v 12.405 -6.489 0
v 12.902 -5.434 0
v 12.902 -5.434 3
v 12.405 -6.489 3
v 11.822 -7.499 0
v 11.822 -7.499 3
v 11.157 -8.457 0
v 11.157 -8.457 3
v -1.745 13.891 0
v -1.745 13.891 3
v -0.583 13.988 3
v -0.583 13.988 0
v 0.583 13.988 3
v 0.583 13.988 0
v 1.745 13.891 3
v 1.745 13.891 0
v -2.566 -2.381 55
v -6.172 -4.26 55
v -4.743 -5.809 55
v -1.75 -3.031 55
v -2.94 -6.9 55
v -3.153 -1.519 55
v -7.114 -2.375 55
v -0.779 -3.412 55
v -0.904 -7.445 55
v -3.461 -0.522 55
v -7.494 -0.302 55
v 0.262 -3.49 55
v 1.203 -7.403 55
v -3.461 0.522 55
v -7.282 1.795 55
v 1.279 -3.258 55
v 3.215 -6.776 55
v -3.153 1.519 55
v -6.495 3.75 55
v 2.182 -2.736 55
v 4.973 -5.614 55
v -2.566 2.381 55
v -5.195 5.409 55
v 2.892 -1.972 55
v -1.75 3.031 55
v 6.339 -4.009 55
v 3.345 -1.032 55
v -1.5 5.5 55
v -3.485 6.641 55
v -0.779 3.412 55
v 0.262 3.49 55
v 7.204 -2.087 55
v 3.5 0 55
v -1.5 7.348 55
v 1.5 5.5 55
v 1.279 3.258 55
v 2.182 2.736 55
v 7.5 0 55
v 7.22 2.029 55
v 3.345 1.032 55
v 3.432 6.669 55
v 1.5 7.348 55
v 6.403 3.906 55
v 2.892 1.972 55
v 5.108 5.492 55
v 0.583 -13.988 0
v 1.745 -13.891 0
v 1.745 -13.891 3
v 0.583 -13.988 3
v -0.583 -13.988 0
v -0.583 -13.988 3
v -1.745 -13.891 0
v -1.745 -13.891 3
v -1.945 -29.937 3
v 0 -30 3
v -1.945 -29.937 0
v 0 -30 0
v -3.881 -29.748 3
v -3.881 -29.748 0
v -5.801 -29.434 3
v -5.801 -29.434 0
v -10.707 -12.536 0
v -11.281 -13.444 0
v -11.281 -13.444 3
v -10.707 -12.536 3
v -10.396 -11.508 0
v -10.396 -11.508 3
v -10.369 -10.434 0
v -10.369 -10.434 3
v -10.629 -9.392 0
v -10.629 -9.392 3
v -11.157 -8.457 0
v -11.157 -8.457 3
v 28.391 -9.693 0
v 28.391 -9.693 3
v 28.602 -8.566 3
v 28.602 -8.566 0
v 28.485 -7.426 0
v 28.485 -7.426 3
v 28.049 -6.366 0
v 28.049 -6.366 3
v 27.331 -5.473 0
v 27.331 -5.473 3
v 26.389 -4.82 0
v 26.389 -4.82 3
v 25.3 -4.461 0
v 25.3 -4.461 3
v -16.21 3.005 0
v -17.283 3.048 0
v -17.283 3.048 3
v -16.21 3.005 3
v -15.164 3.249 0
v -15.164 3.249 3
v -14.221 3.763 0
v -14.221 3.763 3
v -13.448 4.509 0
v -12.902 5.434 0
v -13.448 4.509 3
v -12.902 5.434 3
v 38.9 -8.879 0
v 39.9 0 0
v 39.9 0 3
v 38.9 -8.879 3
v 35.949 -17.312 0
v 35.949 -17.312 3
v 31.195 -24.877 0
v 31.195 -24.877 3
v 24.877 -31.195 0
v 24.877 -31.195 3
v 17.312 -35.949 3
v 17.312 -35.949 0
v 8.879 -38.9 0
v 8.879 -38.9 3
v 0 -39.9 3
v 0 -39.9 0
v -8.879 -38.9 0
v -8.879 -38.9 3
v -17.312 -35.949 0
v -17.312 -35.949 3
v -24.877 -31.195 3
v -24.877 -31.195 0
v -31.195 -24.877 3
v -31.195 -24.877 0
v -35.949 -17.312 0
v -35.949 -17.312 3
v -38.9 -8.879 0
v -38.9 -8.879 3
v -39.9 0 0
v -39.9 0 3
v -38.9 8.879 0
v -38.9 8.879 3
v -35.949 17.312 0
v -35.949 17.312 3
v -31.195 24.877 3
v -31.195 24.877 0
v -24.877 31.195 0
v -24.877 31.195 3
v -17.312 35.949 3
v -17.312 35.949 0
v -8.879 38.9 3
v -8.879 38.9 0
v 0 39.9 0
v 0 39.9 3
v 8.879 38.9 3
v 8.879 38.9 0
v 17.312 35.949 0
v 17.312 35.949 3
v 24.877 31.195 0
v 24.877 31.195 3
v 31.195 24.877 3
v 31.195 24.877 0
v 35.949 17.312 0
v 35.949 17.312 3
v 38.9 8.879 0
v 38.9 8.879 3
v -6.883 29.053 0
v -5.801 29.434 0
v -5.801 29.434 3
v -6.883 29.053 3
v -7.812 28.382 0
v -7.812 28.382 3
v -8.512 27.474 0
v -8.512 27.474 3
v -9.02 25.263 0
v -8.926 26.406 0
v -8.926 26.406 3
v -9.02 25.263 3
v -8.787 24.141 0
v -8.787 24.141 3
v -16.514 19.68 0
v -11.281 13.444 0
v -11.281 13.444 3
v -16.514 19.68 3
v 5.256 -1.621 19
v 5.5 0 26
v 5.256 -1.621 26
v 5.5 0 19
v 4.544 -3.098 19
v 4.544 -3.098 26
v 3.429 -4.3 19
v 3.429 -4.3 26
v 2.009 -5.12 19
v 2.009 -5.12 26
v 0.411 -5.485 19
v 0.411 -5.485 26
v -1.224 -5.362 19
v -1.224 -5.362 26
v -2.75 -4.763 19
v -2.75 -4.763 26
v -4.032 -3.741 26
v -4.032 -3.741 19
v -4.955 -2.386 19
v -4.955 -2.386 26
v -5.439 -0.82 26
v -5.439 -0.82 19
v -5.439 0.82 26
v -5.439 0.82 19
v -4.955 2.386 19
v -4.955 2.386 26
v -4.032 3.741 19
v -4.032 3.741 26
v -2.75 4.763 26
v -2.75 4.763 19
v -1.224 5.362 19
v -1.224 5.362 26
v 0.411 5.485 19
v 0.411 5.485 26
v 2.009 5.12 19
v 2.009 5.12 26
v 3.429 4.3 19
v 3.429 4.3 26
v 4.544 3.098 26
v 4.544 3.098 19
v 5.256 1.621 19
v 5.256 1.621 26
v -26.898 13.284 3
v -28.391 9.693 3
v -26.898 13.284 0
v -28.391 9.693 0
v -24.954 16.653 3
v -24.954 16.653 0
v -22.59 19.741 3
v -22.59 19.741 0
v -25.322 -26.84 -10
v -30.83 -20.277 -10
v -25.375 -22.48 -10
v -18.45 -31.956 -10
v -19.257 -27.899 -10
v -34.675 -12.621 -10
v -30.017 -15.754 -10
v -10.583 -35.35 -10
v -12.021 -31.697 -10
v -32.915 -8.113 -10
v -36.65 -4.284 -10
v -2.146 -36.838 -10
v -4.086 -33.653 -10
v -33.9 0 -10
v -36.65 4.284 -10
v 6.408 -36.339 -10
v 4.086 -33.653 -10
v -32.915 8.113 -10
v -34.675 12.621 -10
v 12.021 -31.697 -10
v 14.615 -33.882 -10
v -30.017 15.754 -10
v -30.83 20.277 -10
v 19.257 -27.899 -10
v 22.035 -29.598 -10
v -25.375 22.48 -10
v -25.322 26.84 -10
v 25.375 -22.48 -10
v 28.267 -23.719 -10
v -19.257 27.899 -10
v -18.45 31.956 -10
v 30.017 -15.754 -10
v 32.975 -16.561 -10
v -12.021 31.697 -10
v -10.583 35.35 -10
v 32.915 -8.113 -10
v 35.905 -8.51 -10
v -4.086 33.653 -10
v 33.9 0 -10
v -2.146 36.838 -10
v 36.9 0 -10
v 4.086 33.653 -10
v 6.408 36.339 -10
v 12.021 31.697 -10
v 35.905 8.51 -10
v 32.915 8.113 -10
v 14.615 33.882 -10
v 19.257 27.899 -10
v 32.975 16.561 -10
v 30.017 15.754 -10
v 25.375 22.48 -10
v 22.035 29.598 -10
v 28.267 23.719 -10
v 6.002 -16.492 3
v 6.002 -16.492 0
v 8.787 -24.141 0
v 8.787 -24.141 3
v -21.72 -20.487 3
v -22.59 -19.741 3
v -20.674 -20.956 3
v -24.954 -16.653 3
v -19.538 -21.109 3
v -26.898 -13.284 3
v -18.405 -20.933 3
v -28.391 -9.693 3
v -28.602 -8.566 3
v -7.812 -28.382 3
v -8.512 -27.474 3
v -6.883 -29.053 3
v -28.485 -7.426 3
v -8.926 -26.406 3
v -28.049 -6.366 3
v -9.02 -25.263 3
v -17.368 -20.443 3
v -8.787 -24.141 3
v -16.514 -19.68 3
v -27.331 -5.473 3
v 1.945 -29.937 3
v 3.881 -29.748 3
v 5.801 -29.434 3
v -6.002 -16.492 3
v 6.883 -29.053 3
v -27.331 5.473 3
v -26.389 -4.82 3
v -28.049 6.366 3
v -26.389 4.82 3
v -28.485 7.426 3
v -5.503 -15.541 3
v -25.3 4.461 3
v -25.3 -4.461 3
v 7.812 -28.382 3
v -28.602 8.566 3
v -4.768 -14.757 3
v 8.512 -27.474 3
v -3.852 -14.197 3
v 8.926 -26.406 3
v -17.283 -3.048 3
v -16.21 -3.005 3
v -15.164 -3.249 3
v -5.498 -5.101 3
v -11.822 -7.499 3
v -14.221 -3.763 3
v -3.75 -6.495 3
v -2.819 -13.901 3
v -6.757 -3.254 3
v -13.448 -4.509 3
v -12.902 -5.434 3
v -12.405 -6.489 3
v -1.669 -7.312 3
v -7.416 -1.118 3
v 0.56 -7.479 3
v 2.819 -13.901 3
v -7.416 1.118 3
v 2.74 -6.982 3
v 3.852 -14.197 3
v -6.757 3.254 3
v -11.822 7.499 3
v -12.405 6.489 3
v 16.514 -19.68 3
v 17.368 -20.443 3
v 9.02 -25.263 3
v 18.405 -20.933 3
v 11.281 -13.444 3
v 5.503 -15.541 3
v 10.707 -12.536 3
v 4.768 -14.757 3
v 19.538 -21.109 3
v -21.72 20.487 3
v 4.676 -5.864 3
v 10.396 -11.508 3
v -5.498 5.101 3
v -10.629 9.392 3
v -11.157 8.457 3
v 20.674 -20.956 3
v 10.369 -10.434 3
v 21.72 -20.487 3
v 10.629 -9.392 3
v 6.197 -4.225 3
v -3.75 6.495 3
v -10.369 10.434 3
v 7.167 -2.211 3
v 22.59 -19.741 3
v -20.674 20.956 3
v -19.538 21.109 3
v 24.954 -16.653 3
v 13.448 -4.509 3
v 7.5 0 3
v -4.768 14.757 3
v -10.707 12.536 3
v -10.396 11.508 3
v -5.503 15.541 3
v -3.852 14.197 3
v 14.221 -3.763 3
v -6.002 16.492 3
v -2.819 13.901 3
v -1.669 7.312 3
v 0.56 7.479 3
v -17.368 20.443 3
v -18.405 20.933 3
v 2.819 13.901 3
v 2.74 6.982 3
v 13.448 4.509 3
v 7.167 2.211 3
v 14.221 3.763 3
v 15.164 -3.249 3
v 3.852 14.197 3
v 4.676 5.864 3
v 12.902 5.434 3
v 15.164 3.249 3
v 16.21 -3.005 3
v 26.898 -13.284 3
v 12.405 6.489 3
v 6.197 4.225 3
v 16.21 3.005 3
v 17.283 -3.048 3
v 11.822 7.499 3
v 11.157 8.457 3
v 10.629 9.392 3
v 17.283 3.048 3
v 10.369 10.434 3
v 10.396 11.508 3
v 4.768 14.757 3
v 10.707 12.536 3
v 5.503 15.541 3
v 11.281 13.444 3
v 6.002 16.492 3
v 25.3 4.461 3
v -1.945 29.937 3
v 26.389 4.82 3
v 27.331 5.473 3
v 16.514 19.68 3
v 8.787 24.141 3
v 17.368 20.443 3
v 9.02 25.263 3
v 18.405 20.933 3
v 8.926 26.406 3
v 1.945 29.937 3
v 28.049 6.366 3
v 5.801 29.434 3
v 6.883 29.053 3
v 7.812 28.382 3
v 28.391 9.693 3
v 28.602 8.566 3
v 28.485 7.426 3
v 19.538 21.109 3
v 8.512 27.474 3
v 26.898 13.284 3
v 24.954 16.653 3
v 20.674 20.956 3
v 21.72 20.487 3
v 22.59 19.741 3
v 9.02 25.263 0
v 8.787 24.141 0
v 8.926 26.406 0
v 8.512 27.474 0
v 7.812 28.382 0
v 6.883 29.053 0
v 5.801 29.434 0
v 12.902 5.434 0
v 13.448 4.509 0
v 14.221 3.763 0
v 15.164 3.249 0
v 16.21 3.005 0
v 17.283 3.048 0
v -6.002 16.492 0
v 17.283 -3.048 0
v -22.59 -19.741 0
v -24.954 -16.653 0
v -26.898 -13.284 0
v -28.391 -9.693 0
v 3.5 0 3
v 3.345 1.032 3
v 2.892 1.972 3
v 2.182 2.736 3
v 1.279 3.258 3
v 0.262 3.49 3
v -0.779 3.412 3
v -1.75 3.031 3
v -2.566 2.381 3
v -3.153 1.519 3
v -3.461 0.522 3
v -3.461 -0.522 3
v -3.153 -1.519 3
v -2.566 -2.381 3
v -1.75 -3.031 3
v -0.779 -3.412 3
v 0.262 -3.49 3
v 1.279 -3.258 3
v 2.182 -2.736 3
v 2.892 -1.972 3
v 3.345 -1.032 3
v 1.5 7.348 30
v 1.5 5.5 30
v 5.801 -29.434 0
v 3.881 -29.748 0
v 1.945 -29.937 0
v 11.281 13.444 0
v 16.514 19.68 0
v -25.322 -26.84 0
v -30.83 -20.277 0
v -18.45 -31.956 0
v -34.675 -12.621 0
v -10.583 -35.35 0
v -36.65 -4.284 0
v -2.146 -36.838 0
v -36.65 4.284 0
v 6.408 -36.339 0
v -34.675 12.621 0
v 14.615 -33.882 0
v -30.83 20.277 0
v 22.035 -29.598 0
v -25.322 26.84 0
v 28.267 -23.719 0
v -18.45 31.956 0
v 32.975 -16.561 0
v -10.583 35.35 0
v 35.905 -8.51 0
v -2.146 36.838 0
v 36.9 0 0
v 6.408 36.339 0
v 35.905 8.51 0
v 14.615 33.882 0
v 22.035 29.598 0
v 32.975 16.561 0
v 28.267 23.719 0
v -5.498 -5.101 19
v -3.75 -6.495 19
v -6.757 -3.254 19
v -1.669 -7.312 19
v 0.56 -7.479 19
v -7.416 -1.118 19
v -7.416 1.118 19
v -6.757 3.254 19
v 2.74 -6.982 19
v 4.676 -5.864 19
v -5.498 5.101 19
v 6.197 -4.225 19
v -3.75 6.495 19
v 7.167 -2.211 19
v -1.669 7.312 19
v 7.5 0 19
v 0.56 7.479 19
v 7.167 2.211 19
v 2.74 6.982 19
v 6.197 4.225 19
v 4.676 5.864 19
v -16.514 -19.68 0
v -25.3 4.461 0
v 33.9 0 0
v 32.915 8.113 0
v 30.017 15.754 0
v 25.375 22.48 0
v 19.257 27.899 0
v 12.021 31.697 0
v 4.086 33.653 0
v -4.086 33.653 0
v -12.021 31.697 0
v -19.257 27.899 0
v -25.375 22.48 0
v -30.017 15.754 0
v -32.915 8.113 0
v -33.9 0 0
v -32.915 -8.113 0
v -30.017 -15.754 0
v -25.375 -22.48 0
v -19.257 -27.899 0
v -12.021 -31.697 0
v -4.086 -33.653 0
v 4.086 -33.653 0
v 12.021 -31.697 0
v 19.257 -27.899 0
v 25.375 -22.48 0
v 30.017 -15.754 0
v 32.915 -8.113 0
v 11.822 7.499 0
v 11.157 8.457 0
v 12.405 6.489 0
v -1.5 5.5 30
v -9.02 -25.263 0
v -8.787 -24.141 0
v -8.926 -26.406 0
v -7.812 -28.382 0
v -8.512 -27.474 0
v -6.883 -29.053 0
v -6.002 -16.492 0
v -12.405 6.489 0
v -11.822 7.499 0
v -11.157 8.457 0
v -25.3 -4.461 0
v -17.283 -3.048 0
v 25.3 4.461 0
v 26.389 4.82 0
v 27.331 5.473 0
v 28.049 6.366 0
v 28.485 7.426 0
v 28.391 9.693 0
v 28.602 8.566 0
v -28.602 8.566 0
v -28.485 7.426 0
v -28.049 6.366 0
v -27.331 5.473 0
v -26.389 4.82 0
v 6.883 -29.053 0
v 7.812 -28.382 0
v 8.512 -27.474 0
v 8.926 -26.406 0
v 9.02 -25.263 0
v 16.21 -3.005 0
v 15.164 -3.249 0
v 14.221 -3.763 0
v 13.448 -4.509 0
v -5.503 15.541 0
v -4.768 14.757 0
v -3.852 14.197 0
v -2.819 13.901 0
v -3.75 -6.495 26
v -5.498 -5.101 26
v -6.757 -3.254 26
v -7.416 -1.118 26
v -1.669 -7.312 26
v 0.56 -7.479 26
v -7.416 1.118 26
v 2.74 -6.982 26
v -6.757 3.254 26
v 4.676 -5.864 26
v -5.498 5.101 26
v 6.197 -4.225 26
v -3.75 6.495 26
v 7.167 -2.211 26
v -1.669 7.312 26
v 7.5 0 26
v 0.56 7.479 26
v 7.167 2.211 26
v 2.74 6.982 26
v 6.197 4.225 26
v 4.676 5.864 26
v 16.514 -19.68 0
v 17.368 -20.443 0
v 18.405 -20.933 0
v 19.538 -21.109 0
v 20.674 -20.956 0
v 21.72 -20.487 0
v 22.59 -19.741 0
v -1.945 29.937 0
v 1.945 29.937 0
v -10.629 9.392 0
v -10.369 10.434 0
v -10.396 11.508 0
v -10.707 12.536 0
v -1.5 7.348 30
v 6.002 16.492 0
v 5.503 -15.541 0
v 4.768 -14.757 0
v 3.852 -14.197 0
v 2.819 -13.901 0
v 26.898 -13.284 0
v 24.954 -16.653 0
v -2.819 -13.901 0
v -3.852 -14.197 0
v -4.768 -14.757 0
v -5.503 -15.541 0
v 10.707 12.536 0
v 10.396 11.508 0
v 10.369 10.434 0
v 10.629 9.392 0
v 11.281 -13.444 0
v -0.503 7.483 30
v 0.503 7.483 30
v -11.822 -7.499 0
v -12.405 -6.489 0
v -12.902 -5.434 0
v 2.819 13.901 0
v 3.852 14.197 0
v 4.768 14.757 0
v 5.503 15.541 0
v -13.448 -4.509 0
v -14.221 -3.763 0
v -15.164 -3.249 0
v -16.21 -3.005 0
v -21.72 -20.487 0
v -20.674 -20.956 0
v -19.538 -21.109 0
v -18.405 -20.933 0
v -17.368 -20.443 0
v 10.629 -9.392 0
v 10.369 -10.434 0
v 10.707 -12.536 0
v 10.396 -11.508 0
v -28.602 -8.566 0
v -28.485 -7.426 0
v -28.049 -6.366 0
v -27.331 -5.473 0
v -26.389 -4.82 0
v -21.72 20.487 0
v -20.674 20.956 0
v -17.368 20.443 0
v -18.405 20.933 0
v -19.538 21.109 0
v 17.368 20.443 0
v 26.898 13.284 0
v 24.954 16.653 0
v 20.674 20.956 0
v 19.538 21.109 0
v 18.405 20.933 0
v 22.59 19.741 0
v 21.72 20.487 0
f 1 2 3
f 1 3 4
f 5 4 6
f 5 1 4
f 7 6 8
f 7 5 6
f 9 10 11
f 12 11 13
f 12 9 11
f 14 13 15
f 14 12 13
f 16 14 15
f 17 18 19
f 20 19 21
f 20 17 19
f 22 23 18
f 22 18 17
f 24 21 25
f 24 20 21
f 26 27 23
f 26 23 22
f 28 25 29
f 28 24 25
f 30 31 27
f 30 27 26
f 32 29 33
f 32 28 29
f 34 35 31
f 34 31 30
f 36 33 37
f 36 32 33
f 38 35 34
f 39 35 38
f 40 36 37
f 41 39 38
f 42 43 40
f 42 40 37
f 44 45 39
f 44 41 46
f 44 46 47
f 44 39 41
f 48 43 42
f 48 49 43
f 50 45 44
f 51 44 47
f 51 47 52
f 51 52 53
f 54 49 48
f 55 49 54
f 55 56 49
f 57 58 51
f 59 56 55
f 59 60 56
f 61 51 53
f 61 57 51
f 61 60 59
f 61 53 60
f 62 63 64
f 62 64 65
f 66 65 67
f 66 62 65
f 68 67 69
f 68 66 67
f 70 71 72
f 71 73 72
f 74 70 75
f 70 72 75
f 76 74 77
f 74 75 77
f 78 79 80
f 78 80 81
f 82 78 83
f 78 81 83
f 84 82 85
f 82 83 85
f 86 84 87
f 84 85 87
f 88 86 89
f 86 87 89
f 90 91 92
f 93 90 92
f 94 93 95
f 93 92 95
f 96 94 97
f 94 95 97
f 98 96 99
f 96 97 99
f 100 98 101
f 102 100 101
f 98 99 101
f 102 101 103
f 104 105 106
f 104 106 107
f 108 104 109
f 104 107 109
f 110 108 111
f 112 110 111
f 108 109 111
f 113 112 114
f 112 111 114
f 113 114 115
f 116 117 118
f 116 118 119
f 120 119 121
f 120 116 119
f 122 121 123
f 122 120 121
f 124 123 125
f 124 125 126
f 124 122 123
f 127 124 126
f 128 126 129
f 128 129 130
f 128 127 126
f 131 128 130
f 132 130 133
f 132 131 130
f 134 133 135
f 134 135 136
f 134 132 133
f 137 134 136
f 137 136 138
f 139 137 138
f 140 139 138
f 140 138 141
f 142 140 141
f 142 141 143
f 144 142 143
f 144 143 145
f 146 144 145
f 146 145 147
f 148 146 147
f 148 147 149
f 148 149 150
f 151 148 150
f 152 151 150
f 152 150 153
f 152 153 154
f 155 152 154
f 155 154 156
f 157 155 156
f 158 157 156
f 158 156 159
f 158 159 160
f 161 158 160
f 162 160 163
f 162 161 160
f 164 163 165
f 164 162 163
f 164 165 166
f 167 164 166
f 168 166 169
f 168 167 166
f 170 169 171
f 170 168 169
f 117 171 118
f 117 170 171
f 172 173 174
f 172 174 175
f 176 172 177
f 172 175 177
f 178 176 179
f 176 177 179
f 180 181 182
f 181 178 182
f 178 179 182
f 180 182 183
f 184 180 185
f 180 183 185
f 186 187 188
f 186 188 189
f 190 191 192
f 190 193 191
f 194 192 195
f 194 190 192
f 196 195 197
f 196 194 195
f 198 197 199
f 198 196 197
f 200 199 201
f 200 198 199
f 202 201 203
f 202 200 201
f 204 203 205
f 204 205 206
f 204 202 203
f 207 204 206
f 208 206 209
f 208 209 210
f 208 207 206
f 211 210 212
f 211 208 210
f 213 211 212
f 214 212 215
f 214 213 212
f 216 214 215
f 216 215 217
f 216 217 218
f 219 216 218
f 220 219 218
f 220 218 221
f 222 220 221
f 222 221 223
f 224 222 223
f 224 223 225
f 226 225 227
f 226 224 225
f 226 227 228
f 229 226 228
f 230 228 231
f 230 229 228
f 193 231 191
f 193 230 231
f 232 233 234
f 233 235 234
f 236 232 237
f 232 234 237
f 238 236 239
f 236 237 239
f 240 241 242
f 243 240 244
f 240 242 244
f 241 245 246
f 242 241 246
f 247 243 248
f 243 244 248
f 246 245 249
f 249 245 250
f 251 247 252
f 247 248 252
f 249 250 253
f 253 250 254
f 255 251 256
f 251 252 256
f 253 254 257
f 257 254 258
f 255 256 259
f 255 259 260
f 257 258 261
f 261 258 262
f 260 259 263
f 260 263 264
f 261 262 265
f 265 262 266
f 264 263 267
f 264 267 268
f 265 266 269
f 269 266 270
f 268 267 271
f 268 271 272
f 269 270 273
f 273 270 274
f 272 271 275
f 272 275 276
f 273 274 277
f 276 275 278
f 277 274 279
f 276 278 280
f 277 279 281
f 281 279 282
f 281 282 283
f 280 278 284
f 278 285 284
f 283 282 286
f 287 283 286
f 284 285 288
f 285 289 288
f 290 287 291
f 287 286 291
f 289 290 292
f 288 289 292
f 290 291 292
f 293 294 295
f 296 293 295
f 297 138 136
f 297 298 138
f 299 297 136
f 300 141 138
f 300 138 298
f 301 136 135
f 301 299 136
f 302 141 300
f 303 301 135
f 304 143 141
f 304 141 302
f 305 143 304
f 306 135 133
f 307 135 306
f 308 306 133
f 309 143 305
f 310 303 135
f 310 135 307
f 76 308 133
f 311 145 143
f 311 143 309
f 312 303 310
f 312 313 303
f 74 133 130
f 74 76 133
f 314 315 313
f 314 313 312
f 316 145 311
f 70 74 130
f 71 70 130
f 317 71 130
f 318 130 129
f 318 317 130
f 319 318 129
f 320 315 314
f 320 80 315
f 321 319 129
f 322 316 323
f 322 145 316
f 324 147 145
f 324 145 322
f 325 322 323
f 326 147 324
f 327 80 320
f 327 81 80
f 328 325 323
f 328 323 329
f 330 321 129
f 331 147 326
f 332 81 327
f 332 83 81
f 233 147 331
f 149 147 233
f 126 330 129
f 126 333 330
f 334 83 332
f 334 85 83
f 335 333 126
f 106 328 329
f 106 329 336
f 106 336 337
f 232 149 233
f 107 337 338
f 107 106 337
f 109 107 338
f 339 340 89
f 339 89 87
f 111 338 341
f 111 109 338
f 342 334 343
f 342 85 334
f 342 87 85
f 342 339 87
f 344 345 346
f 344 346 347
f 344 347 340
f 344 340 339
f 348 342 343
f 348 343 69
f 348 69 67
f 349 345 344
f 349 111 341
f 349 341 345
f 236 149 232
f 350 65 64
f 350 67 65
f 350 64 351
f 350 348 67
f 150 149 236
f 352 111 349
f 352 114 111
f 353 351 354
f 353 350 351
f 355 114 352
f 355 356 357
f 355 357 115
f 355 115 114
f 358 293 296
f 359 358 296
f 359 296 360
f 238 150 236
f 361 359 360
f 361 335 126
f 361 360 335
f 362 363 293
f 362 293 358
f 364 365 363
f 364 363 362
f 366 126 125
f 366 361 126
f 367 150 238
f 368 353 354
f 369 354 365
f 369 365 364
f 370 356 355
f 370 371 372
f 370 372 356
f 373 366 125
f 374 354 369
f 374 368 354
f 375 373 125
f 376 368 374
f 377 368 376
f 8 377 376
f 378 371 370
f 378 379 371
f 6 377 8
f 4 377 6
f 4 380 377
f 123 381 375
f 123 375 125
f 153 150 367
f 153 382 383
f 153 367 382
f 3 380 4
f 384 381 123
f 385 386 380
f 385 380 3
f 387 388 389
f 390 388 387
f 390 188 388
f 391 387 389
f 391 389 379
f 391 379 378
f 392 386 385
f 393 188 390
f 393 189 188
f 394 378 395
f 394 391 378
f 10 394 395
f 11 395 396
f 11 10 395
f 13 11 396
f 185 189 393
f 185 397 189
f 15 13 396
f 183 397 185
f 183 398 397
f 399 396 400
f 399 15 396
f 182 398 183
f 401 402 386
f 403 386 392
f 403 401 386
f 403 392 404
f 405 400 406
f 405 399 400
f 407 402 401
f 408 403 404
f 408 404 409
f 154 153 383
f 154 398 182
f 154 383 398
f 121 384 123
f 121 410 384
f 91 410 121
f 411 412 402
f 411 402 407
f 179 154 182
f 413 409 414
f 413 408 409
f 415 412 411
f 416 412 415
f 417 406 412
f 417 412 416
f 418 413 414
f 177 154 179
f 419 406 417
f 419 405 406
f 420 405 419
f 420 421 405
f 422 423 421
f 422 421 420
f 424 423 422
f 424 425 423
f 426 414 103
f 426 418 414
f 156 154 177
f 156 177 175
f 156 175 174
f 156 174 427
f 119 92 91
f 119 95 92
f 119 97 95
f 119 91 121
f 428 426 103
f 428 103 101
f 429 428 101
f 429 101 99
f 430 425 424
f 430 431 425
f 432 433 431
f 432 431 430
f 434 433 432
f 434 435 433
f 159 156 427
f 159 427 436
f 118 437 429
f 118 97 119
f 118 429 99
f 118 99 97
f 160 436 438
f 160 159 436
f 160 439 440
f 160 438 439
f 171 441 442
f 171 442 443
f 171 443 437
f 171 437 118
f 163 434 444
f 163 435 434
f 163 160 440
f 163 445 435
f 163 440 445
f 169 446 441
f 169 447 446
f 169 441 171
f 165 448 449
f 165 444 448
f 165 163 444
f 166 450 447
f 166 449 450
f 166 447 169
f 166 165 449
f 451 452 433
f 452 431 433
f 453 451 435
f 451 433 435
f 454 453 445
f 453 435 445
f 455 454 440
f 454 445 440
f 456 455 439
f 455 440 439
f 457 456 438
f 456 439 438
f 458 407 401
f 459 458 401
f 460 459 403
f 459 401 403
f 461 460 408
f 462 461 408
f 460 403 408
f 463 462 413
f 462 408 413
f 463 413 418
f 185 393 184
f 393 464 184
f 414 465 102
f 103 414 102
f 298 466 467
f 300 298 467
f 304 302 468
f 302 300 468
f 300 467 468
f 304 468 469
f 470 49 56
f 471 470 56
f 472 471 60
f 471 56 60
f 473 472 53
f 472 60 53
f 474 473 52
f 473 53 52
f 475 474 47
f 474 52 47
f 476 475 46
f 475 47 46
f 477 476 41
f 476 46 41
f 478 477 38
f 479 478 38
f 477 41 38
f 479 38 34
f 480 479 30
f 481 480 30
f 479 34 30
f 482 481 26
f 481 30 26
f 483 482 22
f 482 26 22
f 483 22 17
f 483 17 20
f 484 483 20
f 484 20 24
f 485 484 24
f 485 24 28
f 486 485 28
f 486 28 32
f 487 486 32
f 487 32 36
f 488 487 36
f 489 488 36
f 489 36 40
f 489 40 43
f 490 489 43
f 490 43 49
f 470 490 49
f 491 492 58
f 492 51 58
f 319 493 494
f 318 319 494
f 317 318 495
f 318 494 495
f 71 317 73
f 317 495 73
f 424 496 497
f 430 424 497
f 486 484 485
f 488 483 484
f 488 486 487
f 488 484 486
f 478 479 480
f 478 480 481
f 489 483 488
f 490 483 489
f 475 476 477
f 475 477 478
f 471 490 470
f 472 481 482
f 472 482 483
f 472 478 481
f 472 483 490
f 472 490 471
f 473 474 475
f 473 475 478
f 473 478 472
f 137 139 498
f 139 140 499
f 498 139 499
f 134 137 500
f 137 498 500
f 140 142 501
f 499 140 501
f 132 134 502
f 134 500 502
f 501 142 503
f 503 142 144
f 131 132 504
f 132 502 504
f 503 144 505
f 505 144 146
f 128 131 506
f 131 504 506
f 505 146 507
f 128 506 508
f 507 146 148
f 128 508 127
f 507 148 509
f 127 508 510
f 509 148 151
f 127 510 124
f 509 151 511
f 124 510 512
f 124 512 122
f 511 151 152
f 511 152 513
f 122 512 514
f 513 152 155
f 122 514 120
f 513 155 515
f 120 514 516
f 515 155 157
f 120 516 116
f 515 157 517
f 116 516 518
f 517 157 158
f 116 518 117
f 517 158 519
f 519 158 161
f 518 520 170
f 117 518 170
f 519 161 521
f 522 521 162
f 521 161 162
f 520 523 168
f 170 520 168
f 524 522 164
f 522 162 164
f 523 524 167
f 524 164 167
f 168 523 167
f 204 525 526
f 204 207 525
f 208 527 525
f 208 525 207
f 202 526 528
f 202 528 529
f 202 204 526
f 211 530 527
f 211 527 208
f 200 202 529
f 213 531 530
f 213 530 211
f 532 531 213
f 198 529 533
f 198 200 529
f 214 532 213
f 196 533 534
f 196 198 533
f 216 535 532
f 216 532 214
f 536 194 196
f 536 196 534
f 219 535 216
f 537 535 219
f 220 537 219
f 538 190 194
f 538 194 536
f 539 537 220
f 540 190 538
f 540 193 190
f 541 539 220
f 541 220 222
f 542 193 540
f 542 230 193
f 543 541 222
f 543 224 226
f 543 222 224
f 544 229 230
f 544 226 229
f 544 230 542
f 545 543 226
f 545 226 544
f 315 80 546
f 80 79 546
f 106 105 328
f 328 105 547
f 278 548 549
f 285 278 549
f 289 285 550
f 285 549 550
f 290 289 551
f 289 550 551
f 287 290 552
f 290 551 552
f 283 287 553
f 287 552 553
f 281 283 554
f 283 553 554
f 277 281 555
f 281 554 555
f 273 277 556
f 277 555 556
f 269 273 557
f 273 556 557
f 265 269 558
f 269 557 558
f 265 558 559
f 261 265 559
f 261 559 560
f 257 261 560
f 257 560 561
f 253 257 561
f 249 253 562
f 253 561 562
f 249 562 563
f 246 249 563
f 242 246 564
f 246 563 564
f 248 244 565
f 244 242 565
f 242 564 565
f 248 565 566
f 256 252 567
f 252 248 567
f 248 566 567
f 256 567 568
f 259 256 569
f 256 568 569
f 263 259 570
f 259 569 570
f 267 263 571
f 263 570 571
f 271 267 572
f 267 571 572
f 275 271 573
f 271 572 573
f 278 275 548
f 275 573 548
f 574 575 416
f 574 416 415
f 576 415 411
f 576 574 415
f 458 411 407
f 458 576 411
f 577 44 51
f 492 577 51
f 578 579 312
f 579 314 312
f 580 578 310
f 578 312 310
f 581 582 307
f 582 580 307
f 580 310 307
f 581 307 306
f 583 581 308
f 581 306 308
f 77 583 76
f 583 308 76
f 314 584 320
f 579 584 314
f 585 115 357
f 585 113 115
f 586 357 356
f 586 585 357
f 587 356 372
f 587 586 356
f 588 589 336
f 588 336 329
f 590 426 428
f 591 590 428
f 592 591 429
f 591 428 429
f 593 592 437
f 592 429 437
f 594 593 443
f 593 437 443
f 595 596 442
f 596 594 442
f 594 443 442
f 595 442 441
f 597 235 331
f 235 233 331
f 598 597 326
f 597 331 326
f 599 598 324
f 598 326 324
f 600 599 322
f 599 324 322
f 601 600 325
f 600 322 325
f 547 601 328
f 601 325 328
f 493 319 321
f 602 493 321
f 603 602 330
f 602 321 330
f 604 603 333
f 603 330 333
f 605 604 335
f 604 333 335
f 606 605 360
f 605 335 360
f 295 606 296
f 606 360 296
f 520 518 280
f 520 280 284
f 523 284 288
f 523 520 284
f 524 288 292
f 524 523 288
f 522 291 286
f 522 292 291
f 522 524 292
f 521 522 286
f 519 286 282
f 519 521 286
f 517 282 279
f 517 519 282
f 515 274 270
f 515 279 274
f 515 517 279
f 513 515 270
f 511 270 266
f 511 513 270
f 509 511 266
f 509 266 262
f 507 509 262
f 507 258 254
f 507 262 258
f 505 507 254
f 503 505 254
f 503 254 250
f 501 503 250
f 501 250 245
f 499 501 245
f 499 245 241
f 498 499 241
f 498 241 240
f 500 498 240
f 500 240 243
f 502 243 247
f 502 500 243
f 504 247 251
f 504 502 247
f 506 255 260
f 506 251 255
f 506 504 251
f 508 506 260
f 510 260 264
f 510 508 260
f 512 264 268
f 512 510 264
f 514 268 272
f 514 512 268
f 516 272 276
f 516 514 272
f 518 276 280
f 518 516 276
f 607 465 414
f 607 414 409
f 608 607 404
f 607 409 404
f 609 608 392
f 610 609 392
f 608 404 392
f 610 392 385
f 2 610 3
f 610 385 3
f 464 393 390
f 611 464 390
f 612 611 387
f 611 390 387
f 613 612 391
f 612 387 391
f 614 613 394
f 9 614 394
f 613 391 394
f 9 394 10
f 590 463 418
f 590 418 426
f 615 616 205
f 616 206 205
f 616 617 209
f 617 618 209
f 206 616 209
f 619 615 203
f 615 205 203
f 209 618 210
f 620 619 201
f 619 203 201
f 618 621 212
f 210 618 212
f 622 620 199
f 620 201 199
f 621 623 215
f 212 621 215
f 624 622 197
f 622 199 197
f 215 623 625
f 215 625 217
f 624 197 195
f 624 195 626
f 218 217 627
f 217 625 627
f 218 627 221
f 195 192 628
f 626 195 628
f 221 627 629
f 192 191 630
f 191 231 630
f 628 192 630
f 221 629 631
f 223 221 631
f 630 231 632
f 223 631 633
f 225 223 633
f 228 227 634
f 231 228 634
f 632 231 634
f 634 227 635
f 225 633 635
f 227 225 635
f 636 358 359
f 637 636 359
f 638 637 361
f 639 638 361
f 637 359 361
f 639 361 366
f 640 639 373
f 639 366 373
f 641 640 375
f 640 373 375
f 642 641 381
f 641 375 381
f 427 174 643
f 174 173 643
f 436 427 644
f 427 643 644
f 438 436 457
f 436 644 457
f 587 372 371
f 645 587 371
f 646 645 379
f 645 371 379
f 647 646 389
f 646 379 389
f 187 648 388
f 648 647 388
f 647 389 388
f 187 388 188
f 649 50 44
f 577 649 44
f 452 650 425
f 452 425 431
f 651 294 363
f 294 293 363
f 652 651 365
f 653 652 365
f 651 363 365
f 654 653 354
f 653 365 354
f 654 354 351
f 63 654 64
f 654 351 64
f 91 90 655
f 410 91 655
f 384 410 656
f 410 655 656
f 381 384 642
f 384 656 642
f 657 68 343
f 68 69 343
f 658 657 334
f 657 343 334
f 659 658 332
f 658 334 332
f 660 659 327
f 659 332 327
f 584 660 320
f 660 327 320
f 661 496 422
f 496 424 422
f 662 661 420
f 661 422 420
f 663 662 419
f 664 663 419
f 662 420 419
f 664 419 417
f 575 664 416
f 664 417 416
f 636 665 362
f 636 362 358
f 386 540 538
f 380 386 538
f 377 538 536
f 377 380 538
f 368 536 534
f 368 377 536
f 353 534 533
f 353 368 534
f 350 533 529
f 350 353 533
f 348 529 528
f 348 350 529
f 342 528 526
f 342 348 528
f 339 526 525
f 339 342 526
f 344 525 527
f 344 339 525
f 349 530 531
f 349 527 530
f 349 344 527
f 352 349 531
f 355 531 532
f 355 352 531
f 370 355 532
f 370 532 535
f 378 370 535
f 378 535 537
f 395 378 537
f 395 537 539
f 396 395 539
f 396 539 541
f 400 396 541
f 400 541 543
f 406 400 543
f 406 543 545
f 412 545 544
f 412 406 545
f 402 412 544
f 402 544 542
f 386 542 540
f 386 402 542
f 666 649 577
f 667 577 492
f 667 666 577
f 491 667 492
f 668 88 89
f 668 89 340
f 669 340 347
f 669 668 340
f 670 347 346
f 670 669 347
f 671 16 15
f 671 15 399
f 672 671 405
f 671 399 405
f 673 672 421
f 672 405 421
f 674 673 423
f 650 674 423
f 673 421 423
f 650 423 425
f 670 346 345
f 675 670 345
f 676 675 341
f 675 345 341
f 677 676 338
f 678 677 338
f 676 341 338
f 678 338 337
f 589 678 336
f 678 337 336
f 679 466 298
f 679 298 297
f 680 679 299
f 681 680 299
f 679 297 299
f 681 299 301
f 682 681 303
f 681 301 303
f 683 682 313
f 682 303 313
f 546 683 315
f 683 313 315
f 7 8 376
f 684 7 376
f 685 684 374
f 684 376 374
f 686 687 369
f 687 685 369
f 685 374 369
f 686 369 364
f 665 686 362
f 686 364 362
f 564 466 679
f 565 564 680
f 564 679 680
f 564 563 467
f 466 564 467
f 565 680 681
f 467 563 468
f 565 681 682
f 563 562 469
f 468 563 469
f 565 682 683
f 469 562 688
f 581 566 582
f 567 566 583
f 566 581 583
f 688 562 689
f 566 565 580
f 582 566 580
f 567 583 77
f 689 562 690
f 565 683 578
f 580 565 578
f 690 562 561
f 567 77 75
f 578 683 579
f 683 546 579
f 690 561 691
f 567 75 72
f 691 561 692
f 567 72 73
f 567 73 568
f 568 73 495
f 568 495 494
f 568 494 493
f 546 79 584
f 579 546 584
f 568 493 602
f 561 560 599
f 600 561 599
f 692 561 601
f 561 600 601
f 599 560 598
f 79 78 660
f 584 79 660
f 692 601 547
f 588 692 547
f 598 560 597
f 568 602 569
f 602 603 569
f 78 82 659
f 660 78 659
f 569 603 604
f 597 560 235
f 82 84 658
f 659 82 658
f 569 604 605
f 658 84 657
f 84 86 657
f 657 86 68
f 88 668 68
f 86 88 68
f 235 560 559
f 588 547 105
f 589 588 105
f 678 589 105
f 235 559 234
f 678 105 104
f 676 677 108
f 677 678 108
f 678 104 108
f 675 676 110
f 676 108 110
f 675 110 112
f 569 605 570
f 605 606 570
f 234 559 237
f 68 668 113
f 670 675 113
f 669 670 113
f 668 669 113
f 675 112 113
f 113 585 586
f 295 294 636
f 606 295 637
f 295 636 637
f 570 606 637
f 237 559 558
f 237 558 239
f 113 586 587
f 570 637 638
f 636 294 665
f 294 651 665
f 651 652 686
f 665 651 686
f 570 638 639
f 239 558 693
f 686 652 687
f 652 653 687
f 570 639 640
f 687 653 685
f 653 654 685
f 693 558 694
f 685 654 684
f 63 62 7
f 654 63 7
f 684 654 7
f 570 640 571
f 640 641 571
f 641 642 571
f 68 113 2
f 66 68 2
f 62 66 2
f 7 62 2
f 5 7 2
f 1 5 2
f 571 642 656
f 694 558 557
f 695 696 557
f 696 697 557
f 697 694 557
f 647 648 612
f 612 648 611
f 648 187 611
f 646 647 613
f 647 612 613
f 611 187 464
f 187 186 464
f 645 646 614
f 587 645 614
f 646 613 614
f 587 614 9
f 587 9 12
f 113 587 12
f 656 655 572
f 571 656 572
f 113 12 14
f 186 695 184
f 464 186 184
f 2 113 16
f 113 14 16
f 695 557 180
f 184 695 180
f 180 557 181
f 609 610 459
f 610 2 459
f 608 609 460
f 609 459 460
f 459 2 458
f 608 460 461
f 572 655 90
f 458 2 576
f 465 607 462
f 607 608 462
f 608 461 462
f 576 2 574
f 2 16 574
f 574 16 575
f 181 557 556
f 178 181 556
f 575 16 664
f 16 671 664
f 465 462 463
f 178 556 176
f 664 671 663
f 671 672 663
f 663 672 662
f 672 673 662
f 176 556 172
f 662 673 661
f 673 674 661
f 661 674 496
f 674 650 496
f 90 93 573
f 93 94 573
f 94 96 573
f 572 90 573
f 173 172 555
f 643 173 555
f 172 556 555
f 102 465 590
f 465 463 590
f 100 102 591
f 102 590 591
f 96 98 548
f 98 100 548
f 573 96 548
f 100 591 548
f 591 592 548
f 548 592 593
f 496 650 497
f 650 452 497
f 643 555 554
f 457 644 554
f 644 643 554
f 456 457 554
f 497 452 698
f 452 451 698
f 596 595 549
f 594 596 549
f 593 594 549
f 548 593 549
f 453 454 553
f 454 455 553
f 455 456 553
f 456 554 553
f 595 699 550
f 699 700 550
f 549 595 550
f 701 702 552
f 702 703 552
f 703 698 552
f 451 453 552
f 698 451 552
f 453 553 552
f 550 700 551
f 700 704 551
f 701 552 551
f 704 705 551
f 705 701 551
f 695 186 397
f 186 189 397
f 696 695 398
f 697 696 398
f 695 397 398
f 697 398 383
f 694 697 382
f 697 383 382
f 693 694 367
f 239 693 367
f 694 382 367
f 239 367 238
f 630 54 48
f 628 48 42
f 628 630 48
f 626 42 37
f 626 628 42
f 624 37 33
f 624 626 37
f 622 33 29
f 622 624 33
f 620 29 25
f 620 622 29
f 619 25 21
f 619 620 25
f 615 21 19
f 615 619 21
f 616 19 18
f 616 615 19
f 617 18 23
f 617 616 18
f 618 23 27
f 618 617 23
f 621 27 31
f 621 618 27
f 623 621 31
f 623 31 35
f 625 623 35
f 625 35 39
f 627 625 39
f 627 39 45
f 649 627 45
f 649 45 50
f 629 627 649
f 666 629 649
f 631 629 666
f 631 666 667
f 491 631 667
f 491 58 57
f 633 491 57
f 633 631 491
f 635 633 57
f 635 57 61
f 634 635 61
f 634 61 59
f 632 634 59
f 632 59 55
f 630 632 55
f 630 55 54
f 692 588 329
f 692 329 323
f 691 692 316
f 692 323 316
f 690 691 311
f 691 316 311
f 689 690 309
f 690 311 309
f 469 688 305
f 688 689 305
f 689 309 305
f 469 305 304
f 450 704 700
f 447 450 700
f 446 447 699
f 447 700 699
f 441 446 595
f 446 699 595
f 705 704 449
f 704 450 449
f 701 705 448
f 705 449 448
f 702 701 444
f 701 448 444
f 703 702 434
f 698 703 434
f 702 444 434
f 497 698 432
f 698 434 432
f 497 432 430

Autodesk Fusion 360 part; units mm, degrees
sketch "Sketch1" plane through (0, 0, 0) normal (0, 0, 1) x (1, 0, 0)
  circle A0 centre (0, 0) radius 33.9
  circle A1 centre (0, 0) radius 36.9
  circle A2 centre (0, 0) radius 39.9
  circle A3 centre (0, 0) radius 7.5
  circle A4 centre (0, 0) radius 14
  line L0 (0, 0) -> (4.7883, -13.1557)
  line L1 (0, 0) -> (-4.7883, -13.1557)
  line L2 (0, -60) -> (0, 60)
  line L3 (4.7883, -13.1557) -> (10.2606, -28.1908)
  line L4 (-4.7883, -13.1557) -> (-10.2606, -28.1908)
  arc A5 (10.2606, -28.1908) -> (-10.2606, -28.1908) centre (0, 0) ccw
  arc A6 (-10.2606, -28.1908) -> (0, -30) centre (0, 0) ccw
  arc A7 (0, -30) -> (10.2606, -28.1908) centre (0, 0) ccw
  line L5 (13.7873, -2.4311) -> (29.5442, -5.2094)
  line L6 (8.999, -10.7246) -> (19.2836, -22.9813)
  line L7 (8.999, 10.7246) -> (19.2836, 22.9813)
  line L8 (13.7873, 2.4311) -> (29.5442, 5.2094)
  line L9 (-4.7883, 13.1557) -> (-10.2606, 28.1908)
  line L10 (4.7883, 13.1557) -> (10.2606, 28.1908)
  line L11 (-13.7873, 2.4311) -> (-29.5442, 5.2094)
  line L12 (-8.999, 10.7246) -> (-19.2836, 22.9813)
  line L13 (-8.999, -10.7246) -> (-19.2836, -22.9813)
  line L14 (-13.7873, -2.4311) -> (-29.5442, -5.2094)
  circle A8 centre (0, 0) radius 3.5
  line L15 (-1.5, 7.3485) -> (-1.5, 5.5)
  line L16 (-1.5, 5.5) -> (1.5, 5.5)
  line L17 (1.5, 5.5) -> (1.5, 7.3485)
  circle A9 centre (0, 0) radius 5.5
  point P0 (0, 7.5)
  dimension "d1" = 67.8
  dimension "d2" = 3
  dimension "d3" = 3
  dimension "d4" = 15
  dimension "d11" = 28
  dimension "d12" = 60
  dimension "d13" = 40
  dimension "d15" = 20
  dimension "d17" = 360
  dimension "d22" = -4
  dimension "d34" = 3
  dimension "d35" = 2
  dimension "d43" = -2
extrude "Extrude1" add sketch "Sketch1" against normal blind 10 contours A0 A1 L2 | A0 A1 L2
extrude "Extrude2" add sketch "Sketch1" along normal blind 3
extrude "Extrude3" add sketch "Sketch1" along normal blind 55 contours A3 L2 L15 L16 | A3 L2 L16 L17 | A3 L0 L2 A9 | A3 L1 L2 A9 | A3 L0 L16 L17 A9 | A3 L1 L15 L16 A9 | L0 L2 A8 A9 | L1 L2 A8 A9 | L1 L2 A8 A9 | L0 L2 A8 A9 | L0 L2 A8 | L1 L2 A8 | L1 L2 A8 | L0 L2 A8
extrude "Extrude4" cut sketch "Sketch1" along normal blind 3 contours A4 L2 A5 L10 | A4 L2 A5 L9 | A4 L2 L4 A6 | A4 L2 L3 A7 | A4 A5 L7 L8 | A4 A5 L11 L12 | A4 A5 L13 L14 | A4 A5 L5 L6
fillet "Fillet1" radius 4 24 edges at (-19.2836, 22.9813, 1.5) (-29.5442, 5.2094, 1.5) (-13.7873, 2.4311, 1.5) (-8.999, 10.7246, 1.5) (-13.7873, -2.4311, 1.5) (-29.5442, -5.2094, 1.5) (-19.2836, -22.9813, 1.5) (-8.999, -10.7246, 1.5) (-4.7883, -13.1557, 1.5) (-10.2606, -28.1908, 1.5) (10.2606, -28.1908, 1.5) (4.7883, -13.1557, 1.5) (8.999, -10.7246, 1.5) (19.2836, -22.9813, 1.5) (29.5442, -5.2094, 1.5) (13.7873, -2.4311, 1.5) (29.5442, 5.2094, 1.5) (19.2836, 22.9813, 1.5) (13.7873, 2.4311, 1.5) (8.999, 10.7246, 1.5) (4.7883, 13.1557, 1.5) (10.2606, 28.1908, 1.5) (-4.7883, 13.1557, 1.5) (-10.2606, 28.1908, 1.5)
extrude "Extrude5" cut sketch "Sketch1" against normal up to surface (52 mm away) from surface at 55 contours L0 L2 A8 | L1 L2 A8 | L1 L2 A8 | L0 L2 A8
extrude "Extrude8" cut sketch "Sketch1" against normal blind 25 from surface at 55 contours A3 L2 L15 L16 | A3 L2 L16 L17
extrude "Extrude9" cut sketch "Sketch1" along normal blind 7 from surface at 19 contours A3 L2 L15 L16 | A3 L2 L16 L17 | A3 L0 L2 A9 | A3 L1 L2 A9 | A3 L0 L16 L17 A9 | A3 L1 L15 L16 A9
